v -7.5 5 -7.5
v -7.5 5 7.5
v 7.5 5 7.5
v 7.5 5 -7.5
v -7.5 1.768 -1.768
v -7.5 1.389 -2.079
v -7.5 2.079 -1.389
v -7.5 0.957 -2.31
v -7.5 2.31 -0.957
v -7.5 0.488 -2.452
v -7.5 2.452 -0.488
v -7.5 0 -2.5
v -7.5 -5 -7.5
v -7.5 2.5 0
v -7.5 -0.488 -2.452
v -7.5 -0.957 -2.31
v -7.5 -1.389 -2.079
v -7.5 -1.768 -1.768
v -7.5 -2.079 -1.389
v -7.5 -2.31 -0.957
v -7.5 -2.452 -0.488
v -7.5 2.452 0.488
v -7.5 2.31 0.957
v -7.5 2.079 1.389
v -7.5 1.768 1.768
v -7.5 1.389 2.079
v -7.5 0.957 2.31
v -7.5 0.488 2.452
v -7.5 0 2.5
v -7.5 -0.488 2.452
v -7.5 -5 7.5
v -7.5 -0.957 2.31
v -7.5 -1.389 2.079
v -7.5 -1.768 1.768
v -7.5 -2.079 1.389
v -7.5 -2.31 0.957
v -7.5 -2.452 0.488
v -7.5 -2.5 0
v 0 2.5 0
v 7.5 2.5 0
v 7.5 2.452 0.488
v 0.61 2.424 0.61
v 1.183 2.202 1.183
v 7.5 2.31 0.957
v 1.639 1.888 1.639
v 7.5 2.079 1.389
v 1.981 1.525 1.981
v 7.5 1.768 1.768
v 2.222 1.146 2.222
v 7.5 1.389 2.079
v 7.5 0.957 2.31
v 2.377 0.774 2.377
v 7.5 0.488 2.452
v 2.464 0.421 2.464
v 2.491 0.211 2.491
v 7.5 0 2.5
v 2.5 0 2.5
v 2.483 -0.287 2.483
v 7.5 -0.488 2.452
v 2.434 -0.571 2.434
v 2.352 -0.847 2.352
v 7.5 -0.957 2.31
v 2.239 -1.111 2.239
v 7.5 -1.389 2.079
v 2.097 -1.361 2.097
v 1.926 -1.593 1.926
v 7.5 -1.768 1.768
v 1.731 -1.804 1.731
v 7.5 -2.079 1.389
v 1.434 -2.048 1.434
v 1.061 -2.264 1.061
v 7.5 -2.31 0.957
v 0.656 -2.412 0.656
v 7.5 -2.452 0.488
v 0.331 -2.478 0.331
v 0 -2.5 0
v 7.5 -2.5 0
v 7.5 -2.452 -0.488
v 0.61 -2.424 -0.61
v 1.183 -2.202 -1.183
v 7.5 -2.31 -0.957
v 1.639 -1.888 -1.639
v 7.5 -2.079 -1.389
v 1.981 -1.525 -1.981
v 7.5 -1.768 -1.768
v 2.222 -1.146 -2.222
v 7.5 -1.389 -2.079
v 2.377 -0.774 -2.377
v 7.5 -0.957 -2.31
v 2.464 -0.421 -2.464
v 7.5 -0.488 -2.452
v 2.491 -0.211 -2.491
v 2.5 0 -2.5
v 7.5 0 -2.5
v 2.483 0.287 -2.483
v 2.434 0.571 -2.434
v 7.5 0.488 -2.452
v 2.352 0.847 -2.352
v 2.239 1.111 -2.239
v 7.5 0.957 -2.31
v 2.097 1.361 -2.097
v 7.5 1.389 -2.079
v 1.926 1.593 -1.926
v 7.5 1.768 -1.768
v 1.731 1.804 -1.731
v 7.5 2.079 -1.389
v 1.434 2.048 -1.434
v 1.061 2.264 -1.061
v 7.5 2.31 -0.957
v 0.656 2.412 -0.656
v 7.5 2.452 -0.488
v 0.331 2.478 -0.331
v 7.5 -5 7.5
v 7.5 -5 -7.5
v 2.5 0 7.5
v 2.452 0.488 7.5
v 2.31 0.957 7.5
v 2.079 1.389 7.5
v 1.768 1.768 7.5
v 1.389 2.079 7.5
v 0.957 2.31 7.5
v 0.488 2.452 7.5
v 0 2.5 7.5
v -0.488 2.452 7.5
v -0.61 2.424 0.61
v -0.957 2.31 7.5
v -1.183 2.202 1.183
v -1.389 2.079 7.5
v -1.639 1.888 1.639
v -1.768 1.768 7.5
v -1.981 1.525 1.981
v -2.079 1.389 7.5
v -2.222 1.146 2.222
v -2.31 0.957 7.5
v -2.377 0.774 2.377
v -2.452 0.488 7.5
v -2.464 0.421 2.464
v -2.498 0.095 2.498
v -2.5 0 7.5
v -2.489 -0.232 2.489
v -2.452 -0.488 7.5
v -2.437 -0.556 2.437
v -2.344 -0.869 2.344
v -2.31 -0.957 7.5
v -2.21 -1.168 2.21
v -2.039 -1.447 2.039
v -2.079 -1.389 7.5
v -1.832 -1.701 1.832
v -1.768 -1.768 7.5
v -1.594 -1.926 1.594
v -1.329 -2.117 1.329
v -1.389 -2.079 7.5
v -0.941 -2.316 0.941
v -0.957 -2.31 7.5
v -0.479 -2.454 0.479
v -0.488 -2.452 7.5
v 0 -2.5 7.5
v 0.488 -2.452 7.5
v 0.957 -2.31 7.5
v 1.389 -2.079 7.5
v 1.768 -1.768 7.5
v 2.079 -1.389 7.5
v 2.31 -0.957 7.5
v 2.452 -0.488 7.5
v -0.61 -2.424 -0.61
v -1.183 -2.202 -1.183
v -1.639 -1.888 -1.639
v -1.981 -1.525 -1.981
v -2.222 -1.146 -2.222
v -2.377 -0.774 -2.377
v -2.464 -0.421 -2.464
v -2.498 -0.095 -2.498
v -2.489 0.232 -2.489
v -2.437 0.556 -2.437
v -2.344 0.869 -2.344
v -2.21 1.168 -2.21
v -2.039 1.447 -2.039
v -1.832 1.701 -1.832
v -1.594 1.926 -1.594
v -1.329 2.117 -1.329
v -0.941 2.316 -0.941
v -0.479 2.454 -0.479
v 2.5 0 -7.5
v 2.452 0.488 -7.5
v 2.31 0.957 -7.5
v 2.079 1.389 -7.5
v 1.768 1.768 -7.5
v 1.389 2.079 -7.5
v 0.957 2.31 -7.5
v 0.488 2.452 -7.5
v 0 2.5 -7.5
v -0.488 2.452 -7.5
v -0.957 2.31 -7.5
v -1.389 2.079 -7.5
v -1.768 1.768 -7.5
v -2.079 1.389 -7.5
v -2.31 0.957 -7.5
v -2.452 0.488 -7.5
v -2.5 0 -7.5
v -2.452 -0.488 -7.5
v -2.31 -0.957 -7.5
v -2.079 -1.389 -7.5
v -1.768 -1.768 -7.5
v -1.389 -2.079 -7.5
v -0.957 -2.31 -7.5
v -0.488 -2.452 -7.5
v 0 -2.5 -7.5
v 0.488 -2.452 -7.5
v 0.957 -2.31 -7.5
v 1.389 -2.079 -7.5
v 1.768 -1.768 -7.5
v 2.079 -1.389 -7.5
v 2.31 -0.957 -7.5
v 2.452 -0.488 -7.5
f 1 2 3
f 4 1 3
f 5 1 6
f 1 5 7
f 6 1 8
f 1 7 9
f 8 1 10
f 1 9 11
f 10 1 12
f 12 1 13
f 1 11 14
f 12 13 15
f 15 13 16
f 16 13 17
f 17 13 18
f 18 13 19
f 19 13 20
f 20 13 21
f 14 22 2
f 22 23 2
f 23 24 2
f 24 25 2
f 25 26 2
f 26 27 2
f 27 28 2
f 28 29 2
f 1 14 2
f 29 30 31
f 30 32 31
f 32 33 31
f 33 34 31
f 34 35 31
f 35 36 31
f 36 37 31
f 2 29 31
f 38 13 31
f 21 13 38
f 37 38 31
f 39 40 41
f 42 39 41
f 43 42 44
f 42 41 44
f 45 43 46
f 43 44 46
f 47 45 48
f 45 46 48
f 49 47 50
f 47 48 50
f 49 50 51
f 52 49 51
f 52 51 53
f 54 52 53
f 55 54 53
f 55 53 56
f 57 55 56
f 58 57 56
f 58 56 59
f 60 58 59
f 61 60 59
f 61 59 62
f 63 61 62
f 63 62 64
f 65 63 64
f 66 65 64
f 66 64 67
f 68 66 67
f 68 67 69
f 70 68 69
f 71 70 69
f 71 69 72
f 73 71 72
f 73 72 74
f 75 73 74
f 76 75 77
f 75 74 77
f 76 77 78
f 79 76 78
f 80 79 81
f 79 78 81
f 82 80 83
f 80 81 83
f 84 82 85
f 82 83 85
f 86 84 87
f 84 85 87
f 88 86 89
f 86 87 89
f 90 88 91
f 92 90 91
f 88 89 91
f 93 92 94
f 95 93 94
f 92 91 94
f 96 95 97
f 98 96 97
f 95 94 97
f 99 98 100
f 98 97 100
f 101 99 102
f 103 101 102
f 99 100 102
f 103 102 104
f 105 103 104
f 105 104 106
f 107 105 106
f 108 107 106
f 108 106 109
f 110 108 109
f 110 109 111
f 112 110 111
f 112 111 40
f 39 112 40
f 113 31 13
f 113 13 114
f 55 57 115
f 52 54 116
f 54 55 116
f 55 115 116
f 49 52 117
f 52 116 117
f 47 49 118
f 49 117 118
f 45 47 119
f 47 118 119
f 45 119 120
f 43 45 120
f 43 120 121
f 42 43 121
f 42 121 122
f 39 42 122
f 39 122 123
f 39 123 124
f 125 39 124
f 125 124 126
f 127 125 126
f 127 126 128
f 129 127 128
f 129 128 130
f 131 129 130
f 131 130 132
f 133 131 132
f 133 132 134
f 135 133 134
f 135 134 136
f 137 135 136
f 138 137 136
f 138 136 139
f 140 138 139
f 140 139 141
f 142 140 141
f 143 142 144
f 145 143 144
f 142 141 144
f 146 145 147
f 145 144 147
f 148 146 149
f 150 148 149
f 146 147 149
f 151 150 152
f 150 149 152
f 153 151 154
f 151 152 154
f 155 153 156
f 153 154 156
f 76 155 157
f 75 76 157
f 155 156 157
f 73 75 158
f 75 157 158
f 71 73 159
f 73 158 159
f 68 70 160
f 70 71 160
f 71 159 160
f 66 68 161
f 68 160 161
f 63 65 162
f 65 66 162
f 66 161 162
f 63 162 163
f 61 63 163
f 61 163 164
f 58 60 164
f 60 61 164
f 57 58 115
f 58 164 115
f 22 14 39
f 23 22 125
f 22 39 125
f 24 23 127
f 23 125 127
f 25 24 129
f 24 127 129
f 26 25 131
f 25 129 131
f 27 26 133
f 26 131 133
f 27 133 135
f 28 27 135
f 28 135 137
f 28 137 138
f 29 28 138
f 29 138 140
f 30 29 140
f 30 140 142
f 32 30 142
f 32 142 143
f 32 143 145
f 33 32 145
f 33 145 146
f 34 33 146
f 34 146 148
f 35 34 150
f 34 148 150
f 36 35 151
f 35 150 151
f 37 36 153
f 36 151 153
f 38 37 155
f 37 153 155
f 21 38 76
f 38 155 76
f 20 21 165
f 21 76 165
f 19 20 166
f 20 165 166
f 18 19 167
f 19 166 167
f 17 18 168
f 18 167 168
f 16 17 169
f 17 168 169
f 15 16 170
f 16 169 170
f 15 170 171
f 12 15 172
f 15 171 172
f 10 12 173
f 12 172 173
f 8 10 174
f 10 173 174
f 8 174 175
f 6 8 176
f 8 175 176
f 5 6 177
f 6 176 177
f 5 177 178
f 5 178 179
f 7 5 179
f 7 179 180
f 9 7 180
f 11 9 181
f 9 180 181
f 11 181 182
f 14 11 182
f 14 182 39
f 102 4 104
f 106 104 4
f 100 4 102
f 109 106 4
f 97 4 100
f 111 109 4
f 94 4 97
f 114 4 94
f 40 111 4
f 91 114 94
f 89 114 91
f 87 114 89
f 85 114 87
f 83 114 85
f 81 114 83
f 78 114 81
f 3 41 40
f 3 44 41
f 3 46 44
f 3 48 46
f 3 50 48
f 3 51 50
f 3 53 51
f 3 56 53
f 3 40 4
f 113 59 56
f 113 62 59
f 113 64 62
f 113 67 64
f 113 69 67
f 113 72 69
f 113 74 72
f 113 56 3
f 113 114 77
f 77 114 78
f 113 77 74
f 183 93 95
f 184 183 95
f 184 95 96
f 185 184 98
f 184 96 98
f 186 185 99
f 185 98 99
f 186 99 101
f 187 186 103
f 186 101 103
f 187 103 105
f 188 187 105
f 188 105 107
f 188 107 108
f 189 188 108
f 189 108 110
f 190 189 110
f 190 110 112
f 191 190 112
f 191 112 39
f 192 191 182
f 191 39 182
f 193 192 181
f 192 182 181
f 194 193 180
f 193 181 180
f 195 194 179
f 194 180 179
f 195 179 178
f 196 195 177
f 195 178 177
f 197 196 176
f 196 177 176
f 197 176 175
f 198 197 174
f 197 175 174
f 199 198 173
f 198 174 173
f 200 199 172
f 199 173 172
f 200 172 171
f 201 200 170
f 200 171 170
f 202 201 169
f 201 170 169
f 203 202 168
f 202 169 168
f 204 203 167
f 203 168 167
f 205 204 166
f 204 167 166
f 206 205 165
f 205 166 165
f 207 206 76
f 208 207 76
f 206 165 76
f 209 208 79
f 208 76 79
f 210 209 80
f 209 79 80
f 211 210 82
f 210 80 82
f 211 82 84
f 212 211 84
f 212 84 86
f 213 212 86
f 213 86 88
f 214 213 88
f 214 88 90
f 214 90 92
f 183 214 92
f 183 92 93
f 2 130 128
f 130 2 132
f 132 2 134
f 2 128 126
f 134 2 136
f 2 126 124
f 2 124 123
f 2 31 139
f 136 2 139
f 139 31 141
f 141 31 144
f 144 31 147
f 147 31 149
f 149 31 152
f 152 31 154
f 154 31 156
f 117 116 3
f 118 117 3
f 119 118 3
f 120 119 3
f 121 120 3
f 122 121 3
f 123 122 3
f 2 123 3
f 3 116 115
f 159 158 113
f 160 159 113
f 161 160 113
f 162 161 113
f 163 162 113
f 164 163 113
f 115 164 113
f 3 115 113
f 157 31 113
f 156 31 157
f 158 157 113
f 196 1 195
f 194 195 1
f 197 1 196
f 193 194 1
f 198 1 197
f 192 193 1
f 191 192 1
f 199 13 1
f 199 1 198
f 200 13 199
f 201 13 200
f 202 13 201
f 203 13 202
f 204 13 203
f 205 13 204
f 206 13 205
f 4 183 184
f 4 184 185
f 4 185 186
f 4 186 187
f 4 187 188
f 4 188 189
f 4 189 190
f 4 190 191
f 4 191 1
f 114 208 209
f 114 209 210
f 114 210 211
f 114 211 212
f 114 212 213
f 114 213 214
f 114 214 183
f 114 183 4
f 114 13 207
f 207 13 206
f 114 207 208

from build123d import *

# Parameters (mm, degrees)
F0_W     = 15
F0_H     = 15
F1_DEPTH = 5
F2_R     = 2.5
F3_DEPTH = 15
F4_R     = 2.5
F5_DEPTH = 15


with BuildPart() as f1:
    # F0 (on Front) → F1 (new body, symmetric)
    with BuildSketch(Plane.XZ):
        Rectangle(F0_W, F0_H)
    extrude(amount=F1_DEPTH, both=True)

    # F2 (on face) → F3 (cut, through all)
    with BuildSketch(Plane.YZ.offset(7.5)):
        Circle(F2_R)
    extrude(amount=-F3_DEPTH, mode=Mode.SUBTRACT)

    # F4 (on face) → F5 (cut, through all)
    with BuildSketch(Plane.XY.offset(7.5)):
        Circle(F4_R)
    extrude(amount=-F5_DEPTH, mode=Mode.SUBTRACT)


solid = f1.part
